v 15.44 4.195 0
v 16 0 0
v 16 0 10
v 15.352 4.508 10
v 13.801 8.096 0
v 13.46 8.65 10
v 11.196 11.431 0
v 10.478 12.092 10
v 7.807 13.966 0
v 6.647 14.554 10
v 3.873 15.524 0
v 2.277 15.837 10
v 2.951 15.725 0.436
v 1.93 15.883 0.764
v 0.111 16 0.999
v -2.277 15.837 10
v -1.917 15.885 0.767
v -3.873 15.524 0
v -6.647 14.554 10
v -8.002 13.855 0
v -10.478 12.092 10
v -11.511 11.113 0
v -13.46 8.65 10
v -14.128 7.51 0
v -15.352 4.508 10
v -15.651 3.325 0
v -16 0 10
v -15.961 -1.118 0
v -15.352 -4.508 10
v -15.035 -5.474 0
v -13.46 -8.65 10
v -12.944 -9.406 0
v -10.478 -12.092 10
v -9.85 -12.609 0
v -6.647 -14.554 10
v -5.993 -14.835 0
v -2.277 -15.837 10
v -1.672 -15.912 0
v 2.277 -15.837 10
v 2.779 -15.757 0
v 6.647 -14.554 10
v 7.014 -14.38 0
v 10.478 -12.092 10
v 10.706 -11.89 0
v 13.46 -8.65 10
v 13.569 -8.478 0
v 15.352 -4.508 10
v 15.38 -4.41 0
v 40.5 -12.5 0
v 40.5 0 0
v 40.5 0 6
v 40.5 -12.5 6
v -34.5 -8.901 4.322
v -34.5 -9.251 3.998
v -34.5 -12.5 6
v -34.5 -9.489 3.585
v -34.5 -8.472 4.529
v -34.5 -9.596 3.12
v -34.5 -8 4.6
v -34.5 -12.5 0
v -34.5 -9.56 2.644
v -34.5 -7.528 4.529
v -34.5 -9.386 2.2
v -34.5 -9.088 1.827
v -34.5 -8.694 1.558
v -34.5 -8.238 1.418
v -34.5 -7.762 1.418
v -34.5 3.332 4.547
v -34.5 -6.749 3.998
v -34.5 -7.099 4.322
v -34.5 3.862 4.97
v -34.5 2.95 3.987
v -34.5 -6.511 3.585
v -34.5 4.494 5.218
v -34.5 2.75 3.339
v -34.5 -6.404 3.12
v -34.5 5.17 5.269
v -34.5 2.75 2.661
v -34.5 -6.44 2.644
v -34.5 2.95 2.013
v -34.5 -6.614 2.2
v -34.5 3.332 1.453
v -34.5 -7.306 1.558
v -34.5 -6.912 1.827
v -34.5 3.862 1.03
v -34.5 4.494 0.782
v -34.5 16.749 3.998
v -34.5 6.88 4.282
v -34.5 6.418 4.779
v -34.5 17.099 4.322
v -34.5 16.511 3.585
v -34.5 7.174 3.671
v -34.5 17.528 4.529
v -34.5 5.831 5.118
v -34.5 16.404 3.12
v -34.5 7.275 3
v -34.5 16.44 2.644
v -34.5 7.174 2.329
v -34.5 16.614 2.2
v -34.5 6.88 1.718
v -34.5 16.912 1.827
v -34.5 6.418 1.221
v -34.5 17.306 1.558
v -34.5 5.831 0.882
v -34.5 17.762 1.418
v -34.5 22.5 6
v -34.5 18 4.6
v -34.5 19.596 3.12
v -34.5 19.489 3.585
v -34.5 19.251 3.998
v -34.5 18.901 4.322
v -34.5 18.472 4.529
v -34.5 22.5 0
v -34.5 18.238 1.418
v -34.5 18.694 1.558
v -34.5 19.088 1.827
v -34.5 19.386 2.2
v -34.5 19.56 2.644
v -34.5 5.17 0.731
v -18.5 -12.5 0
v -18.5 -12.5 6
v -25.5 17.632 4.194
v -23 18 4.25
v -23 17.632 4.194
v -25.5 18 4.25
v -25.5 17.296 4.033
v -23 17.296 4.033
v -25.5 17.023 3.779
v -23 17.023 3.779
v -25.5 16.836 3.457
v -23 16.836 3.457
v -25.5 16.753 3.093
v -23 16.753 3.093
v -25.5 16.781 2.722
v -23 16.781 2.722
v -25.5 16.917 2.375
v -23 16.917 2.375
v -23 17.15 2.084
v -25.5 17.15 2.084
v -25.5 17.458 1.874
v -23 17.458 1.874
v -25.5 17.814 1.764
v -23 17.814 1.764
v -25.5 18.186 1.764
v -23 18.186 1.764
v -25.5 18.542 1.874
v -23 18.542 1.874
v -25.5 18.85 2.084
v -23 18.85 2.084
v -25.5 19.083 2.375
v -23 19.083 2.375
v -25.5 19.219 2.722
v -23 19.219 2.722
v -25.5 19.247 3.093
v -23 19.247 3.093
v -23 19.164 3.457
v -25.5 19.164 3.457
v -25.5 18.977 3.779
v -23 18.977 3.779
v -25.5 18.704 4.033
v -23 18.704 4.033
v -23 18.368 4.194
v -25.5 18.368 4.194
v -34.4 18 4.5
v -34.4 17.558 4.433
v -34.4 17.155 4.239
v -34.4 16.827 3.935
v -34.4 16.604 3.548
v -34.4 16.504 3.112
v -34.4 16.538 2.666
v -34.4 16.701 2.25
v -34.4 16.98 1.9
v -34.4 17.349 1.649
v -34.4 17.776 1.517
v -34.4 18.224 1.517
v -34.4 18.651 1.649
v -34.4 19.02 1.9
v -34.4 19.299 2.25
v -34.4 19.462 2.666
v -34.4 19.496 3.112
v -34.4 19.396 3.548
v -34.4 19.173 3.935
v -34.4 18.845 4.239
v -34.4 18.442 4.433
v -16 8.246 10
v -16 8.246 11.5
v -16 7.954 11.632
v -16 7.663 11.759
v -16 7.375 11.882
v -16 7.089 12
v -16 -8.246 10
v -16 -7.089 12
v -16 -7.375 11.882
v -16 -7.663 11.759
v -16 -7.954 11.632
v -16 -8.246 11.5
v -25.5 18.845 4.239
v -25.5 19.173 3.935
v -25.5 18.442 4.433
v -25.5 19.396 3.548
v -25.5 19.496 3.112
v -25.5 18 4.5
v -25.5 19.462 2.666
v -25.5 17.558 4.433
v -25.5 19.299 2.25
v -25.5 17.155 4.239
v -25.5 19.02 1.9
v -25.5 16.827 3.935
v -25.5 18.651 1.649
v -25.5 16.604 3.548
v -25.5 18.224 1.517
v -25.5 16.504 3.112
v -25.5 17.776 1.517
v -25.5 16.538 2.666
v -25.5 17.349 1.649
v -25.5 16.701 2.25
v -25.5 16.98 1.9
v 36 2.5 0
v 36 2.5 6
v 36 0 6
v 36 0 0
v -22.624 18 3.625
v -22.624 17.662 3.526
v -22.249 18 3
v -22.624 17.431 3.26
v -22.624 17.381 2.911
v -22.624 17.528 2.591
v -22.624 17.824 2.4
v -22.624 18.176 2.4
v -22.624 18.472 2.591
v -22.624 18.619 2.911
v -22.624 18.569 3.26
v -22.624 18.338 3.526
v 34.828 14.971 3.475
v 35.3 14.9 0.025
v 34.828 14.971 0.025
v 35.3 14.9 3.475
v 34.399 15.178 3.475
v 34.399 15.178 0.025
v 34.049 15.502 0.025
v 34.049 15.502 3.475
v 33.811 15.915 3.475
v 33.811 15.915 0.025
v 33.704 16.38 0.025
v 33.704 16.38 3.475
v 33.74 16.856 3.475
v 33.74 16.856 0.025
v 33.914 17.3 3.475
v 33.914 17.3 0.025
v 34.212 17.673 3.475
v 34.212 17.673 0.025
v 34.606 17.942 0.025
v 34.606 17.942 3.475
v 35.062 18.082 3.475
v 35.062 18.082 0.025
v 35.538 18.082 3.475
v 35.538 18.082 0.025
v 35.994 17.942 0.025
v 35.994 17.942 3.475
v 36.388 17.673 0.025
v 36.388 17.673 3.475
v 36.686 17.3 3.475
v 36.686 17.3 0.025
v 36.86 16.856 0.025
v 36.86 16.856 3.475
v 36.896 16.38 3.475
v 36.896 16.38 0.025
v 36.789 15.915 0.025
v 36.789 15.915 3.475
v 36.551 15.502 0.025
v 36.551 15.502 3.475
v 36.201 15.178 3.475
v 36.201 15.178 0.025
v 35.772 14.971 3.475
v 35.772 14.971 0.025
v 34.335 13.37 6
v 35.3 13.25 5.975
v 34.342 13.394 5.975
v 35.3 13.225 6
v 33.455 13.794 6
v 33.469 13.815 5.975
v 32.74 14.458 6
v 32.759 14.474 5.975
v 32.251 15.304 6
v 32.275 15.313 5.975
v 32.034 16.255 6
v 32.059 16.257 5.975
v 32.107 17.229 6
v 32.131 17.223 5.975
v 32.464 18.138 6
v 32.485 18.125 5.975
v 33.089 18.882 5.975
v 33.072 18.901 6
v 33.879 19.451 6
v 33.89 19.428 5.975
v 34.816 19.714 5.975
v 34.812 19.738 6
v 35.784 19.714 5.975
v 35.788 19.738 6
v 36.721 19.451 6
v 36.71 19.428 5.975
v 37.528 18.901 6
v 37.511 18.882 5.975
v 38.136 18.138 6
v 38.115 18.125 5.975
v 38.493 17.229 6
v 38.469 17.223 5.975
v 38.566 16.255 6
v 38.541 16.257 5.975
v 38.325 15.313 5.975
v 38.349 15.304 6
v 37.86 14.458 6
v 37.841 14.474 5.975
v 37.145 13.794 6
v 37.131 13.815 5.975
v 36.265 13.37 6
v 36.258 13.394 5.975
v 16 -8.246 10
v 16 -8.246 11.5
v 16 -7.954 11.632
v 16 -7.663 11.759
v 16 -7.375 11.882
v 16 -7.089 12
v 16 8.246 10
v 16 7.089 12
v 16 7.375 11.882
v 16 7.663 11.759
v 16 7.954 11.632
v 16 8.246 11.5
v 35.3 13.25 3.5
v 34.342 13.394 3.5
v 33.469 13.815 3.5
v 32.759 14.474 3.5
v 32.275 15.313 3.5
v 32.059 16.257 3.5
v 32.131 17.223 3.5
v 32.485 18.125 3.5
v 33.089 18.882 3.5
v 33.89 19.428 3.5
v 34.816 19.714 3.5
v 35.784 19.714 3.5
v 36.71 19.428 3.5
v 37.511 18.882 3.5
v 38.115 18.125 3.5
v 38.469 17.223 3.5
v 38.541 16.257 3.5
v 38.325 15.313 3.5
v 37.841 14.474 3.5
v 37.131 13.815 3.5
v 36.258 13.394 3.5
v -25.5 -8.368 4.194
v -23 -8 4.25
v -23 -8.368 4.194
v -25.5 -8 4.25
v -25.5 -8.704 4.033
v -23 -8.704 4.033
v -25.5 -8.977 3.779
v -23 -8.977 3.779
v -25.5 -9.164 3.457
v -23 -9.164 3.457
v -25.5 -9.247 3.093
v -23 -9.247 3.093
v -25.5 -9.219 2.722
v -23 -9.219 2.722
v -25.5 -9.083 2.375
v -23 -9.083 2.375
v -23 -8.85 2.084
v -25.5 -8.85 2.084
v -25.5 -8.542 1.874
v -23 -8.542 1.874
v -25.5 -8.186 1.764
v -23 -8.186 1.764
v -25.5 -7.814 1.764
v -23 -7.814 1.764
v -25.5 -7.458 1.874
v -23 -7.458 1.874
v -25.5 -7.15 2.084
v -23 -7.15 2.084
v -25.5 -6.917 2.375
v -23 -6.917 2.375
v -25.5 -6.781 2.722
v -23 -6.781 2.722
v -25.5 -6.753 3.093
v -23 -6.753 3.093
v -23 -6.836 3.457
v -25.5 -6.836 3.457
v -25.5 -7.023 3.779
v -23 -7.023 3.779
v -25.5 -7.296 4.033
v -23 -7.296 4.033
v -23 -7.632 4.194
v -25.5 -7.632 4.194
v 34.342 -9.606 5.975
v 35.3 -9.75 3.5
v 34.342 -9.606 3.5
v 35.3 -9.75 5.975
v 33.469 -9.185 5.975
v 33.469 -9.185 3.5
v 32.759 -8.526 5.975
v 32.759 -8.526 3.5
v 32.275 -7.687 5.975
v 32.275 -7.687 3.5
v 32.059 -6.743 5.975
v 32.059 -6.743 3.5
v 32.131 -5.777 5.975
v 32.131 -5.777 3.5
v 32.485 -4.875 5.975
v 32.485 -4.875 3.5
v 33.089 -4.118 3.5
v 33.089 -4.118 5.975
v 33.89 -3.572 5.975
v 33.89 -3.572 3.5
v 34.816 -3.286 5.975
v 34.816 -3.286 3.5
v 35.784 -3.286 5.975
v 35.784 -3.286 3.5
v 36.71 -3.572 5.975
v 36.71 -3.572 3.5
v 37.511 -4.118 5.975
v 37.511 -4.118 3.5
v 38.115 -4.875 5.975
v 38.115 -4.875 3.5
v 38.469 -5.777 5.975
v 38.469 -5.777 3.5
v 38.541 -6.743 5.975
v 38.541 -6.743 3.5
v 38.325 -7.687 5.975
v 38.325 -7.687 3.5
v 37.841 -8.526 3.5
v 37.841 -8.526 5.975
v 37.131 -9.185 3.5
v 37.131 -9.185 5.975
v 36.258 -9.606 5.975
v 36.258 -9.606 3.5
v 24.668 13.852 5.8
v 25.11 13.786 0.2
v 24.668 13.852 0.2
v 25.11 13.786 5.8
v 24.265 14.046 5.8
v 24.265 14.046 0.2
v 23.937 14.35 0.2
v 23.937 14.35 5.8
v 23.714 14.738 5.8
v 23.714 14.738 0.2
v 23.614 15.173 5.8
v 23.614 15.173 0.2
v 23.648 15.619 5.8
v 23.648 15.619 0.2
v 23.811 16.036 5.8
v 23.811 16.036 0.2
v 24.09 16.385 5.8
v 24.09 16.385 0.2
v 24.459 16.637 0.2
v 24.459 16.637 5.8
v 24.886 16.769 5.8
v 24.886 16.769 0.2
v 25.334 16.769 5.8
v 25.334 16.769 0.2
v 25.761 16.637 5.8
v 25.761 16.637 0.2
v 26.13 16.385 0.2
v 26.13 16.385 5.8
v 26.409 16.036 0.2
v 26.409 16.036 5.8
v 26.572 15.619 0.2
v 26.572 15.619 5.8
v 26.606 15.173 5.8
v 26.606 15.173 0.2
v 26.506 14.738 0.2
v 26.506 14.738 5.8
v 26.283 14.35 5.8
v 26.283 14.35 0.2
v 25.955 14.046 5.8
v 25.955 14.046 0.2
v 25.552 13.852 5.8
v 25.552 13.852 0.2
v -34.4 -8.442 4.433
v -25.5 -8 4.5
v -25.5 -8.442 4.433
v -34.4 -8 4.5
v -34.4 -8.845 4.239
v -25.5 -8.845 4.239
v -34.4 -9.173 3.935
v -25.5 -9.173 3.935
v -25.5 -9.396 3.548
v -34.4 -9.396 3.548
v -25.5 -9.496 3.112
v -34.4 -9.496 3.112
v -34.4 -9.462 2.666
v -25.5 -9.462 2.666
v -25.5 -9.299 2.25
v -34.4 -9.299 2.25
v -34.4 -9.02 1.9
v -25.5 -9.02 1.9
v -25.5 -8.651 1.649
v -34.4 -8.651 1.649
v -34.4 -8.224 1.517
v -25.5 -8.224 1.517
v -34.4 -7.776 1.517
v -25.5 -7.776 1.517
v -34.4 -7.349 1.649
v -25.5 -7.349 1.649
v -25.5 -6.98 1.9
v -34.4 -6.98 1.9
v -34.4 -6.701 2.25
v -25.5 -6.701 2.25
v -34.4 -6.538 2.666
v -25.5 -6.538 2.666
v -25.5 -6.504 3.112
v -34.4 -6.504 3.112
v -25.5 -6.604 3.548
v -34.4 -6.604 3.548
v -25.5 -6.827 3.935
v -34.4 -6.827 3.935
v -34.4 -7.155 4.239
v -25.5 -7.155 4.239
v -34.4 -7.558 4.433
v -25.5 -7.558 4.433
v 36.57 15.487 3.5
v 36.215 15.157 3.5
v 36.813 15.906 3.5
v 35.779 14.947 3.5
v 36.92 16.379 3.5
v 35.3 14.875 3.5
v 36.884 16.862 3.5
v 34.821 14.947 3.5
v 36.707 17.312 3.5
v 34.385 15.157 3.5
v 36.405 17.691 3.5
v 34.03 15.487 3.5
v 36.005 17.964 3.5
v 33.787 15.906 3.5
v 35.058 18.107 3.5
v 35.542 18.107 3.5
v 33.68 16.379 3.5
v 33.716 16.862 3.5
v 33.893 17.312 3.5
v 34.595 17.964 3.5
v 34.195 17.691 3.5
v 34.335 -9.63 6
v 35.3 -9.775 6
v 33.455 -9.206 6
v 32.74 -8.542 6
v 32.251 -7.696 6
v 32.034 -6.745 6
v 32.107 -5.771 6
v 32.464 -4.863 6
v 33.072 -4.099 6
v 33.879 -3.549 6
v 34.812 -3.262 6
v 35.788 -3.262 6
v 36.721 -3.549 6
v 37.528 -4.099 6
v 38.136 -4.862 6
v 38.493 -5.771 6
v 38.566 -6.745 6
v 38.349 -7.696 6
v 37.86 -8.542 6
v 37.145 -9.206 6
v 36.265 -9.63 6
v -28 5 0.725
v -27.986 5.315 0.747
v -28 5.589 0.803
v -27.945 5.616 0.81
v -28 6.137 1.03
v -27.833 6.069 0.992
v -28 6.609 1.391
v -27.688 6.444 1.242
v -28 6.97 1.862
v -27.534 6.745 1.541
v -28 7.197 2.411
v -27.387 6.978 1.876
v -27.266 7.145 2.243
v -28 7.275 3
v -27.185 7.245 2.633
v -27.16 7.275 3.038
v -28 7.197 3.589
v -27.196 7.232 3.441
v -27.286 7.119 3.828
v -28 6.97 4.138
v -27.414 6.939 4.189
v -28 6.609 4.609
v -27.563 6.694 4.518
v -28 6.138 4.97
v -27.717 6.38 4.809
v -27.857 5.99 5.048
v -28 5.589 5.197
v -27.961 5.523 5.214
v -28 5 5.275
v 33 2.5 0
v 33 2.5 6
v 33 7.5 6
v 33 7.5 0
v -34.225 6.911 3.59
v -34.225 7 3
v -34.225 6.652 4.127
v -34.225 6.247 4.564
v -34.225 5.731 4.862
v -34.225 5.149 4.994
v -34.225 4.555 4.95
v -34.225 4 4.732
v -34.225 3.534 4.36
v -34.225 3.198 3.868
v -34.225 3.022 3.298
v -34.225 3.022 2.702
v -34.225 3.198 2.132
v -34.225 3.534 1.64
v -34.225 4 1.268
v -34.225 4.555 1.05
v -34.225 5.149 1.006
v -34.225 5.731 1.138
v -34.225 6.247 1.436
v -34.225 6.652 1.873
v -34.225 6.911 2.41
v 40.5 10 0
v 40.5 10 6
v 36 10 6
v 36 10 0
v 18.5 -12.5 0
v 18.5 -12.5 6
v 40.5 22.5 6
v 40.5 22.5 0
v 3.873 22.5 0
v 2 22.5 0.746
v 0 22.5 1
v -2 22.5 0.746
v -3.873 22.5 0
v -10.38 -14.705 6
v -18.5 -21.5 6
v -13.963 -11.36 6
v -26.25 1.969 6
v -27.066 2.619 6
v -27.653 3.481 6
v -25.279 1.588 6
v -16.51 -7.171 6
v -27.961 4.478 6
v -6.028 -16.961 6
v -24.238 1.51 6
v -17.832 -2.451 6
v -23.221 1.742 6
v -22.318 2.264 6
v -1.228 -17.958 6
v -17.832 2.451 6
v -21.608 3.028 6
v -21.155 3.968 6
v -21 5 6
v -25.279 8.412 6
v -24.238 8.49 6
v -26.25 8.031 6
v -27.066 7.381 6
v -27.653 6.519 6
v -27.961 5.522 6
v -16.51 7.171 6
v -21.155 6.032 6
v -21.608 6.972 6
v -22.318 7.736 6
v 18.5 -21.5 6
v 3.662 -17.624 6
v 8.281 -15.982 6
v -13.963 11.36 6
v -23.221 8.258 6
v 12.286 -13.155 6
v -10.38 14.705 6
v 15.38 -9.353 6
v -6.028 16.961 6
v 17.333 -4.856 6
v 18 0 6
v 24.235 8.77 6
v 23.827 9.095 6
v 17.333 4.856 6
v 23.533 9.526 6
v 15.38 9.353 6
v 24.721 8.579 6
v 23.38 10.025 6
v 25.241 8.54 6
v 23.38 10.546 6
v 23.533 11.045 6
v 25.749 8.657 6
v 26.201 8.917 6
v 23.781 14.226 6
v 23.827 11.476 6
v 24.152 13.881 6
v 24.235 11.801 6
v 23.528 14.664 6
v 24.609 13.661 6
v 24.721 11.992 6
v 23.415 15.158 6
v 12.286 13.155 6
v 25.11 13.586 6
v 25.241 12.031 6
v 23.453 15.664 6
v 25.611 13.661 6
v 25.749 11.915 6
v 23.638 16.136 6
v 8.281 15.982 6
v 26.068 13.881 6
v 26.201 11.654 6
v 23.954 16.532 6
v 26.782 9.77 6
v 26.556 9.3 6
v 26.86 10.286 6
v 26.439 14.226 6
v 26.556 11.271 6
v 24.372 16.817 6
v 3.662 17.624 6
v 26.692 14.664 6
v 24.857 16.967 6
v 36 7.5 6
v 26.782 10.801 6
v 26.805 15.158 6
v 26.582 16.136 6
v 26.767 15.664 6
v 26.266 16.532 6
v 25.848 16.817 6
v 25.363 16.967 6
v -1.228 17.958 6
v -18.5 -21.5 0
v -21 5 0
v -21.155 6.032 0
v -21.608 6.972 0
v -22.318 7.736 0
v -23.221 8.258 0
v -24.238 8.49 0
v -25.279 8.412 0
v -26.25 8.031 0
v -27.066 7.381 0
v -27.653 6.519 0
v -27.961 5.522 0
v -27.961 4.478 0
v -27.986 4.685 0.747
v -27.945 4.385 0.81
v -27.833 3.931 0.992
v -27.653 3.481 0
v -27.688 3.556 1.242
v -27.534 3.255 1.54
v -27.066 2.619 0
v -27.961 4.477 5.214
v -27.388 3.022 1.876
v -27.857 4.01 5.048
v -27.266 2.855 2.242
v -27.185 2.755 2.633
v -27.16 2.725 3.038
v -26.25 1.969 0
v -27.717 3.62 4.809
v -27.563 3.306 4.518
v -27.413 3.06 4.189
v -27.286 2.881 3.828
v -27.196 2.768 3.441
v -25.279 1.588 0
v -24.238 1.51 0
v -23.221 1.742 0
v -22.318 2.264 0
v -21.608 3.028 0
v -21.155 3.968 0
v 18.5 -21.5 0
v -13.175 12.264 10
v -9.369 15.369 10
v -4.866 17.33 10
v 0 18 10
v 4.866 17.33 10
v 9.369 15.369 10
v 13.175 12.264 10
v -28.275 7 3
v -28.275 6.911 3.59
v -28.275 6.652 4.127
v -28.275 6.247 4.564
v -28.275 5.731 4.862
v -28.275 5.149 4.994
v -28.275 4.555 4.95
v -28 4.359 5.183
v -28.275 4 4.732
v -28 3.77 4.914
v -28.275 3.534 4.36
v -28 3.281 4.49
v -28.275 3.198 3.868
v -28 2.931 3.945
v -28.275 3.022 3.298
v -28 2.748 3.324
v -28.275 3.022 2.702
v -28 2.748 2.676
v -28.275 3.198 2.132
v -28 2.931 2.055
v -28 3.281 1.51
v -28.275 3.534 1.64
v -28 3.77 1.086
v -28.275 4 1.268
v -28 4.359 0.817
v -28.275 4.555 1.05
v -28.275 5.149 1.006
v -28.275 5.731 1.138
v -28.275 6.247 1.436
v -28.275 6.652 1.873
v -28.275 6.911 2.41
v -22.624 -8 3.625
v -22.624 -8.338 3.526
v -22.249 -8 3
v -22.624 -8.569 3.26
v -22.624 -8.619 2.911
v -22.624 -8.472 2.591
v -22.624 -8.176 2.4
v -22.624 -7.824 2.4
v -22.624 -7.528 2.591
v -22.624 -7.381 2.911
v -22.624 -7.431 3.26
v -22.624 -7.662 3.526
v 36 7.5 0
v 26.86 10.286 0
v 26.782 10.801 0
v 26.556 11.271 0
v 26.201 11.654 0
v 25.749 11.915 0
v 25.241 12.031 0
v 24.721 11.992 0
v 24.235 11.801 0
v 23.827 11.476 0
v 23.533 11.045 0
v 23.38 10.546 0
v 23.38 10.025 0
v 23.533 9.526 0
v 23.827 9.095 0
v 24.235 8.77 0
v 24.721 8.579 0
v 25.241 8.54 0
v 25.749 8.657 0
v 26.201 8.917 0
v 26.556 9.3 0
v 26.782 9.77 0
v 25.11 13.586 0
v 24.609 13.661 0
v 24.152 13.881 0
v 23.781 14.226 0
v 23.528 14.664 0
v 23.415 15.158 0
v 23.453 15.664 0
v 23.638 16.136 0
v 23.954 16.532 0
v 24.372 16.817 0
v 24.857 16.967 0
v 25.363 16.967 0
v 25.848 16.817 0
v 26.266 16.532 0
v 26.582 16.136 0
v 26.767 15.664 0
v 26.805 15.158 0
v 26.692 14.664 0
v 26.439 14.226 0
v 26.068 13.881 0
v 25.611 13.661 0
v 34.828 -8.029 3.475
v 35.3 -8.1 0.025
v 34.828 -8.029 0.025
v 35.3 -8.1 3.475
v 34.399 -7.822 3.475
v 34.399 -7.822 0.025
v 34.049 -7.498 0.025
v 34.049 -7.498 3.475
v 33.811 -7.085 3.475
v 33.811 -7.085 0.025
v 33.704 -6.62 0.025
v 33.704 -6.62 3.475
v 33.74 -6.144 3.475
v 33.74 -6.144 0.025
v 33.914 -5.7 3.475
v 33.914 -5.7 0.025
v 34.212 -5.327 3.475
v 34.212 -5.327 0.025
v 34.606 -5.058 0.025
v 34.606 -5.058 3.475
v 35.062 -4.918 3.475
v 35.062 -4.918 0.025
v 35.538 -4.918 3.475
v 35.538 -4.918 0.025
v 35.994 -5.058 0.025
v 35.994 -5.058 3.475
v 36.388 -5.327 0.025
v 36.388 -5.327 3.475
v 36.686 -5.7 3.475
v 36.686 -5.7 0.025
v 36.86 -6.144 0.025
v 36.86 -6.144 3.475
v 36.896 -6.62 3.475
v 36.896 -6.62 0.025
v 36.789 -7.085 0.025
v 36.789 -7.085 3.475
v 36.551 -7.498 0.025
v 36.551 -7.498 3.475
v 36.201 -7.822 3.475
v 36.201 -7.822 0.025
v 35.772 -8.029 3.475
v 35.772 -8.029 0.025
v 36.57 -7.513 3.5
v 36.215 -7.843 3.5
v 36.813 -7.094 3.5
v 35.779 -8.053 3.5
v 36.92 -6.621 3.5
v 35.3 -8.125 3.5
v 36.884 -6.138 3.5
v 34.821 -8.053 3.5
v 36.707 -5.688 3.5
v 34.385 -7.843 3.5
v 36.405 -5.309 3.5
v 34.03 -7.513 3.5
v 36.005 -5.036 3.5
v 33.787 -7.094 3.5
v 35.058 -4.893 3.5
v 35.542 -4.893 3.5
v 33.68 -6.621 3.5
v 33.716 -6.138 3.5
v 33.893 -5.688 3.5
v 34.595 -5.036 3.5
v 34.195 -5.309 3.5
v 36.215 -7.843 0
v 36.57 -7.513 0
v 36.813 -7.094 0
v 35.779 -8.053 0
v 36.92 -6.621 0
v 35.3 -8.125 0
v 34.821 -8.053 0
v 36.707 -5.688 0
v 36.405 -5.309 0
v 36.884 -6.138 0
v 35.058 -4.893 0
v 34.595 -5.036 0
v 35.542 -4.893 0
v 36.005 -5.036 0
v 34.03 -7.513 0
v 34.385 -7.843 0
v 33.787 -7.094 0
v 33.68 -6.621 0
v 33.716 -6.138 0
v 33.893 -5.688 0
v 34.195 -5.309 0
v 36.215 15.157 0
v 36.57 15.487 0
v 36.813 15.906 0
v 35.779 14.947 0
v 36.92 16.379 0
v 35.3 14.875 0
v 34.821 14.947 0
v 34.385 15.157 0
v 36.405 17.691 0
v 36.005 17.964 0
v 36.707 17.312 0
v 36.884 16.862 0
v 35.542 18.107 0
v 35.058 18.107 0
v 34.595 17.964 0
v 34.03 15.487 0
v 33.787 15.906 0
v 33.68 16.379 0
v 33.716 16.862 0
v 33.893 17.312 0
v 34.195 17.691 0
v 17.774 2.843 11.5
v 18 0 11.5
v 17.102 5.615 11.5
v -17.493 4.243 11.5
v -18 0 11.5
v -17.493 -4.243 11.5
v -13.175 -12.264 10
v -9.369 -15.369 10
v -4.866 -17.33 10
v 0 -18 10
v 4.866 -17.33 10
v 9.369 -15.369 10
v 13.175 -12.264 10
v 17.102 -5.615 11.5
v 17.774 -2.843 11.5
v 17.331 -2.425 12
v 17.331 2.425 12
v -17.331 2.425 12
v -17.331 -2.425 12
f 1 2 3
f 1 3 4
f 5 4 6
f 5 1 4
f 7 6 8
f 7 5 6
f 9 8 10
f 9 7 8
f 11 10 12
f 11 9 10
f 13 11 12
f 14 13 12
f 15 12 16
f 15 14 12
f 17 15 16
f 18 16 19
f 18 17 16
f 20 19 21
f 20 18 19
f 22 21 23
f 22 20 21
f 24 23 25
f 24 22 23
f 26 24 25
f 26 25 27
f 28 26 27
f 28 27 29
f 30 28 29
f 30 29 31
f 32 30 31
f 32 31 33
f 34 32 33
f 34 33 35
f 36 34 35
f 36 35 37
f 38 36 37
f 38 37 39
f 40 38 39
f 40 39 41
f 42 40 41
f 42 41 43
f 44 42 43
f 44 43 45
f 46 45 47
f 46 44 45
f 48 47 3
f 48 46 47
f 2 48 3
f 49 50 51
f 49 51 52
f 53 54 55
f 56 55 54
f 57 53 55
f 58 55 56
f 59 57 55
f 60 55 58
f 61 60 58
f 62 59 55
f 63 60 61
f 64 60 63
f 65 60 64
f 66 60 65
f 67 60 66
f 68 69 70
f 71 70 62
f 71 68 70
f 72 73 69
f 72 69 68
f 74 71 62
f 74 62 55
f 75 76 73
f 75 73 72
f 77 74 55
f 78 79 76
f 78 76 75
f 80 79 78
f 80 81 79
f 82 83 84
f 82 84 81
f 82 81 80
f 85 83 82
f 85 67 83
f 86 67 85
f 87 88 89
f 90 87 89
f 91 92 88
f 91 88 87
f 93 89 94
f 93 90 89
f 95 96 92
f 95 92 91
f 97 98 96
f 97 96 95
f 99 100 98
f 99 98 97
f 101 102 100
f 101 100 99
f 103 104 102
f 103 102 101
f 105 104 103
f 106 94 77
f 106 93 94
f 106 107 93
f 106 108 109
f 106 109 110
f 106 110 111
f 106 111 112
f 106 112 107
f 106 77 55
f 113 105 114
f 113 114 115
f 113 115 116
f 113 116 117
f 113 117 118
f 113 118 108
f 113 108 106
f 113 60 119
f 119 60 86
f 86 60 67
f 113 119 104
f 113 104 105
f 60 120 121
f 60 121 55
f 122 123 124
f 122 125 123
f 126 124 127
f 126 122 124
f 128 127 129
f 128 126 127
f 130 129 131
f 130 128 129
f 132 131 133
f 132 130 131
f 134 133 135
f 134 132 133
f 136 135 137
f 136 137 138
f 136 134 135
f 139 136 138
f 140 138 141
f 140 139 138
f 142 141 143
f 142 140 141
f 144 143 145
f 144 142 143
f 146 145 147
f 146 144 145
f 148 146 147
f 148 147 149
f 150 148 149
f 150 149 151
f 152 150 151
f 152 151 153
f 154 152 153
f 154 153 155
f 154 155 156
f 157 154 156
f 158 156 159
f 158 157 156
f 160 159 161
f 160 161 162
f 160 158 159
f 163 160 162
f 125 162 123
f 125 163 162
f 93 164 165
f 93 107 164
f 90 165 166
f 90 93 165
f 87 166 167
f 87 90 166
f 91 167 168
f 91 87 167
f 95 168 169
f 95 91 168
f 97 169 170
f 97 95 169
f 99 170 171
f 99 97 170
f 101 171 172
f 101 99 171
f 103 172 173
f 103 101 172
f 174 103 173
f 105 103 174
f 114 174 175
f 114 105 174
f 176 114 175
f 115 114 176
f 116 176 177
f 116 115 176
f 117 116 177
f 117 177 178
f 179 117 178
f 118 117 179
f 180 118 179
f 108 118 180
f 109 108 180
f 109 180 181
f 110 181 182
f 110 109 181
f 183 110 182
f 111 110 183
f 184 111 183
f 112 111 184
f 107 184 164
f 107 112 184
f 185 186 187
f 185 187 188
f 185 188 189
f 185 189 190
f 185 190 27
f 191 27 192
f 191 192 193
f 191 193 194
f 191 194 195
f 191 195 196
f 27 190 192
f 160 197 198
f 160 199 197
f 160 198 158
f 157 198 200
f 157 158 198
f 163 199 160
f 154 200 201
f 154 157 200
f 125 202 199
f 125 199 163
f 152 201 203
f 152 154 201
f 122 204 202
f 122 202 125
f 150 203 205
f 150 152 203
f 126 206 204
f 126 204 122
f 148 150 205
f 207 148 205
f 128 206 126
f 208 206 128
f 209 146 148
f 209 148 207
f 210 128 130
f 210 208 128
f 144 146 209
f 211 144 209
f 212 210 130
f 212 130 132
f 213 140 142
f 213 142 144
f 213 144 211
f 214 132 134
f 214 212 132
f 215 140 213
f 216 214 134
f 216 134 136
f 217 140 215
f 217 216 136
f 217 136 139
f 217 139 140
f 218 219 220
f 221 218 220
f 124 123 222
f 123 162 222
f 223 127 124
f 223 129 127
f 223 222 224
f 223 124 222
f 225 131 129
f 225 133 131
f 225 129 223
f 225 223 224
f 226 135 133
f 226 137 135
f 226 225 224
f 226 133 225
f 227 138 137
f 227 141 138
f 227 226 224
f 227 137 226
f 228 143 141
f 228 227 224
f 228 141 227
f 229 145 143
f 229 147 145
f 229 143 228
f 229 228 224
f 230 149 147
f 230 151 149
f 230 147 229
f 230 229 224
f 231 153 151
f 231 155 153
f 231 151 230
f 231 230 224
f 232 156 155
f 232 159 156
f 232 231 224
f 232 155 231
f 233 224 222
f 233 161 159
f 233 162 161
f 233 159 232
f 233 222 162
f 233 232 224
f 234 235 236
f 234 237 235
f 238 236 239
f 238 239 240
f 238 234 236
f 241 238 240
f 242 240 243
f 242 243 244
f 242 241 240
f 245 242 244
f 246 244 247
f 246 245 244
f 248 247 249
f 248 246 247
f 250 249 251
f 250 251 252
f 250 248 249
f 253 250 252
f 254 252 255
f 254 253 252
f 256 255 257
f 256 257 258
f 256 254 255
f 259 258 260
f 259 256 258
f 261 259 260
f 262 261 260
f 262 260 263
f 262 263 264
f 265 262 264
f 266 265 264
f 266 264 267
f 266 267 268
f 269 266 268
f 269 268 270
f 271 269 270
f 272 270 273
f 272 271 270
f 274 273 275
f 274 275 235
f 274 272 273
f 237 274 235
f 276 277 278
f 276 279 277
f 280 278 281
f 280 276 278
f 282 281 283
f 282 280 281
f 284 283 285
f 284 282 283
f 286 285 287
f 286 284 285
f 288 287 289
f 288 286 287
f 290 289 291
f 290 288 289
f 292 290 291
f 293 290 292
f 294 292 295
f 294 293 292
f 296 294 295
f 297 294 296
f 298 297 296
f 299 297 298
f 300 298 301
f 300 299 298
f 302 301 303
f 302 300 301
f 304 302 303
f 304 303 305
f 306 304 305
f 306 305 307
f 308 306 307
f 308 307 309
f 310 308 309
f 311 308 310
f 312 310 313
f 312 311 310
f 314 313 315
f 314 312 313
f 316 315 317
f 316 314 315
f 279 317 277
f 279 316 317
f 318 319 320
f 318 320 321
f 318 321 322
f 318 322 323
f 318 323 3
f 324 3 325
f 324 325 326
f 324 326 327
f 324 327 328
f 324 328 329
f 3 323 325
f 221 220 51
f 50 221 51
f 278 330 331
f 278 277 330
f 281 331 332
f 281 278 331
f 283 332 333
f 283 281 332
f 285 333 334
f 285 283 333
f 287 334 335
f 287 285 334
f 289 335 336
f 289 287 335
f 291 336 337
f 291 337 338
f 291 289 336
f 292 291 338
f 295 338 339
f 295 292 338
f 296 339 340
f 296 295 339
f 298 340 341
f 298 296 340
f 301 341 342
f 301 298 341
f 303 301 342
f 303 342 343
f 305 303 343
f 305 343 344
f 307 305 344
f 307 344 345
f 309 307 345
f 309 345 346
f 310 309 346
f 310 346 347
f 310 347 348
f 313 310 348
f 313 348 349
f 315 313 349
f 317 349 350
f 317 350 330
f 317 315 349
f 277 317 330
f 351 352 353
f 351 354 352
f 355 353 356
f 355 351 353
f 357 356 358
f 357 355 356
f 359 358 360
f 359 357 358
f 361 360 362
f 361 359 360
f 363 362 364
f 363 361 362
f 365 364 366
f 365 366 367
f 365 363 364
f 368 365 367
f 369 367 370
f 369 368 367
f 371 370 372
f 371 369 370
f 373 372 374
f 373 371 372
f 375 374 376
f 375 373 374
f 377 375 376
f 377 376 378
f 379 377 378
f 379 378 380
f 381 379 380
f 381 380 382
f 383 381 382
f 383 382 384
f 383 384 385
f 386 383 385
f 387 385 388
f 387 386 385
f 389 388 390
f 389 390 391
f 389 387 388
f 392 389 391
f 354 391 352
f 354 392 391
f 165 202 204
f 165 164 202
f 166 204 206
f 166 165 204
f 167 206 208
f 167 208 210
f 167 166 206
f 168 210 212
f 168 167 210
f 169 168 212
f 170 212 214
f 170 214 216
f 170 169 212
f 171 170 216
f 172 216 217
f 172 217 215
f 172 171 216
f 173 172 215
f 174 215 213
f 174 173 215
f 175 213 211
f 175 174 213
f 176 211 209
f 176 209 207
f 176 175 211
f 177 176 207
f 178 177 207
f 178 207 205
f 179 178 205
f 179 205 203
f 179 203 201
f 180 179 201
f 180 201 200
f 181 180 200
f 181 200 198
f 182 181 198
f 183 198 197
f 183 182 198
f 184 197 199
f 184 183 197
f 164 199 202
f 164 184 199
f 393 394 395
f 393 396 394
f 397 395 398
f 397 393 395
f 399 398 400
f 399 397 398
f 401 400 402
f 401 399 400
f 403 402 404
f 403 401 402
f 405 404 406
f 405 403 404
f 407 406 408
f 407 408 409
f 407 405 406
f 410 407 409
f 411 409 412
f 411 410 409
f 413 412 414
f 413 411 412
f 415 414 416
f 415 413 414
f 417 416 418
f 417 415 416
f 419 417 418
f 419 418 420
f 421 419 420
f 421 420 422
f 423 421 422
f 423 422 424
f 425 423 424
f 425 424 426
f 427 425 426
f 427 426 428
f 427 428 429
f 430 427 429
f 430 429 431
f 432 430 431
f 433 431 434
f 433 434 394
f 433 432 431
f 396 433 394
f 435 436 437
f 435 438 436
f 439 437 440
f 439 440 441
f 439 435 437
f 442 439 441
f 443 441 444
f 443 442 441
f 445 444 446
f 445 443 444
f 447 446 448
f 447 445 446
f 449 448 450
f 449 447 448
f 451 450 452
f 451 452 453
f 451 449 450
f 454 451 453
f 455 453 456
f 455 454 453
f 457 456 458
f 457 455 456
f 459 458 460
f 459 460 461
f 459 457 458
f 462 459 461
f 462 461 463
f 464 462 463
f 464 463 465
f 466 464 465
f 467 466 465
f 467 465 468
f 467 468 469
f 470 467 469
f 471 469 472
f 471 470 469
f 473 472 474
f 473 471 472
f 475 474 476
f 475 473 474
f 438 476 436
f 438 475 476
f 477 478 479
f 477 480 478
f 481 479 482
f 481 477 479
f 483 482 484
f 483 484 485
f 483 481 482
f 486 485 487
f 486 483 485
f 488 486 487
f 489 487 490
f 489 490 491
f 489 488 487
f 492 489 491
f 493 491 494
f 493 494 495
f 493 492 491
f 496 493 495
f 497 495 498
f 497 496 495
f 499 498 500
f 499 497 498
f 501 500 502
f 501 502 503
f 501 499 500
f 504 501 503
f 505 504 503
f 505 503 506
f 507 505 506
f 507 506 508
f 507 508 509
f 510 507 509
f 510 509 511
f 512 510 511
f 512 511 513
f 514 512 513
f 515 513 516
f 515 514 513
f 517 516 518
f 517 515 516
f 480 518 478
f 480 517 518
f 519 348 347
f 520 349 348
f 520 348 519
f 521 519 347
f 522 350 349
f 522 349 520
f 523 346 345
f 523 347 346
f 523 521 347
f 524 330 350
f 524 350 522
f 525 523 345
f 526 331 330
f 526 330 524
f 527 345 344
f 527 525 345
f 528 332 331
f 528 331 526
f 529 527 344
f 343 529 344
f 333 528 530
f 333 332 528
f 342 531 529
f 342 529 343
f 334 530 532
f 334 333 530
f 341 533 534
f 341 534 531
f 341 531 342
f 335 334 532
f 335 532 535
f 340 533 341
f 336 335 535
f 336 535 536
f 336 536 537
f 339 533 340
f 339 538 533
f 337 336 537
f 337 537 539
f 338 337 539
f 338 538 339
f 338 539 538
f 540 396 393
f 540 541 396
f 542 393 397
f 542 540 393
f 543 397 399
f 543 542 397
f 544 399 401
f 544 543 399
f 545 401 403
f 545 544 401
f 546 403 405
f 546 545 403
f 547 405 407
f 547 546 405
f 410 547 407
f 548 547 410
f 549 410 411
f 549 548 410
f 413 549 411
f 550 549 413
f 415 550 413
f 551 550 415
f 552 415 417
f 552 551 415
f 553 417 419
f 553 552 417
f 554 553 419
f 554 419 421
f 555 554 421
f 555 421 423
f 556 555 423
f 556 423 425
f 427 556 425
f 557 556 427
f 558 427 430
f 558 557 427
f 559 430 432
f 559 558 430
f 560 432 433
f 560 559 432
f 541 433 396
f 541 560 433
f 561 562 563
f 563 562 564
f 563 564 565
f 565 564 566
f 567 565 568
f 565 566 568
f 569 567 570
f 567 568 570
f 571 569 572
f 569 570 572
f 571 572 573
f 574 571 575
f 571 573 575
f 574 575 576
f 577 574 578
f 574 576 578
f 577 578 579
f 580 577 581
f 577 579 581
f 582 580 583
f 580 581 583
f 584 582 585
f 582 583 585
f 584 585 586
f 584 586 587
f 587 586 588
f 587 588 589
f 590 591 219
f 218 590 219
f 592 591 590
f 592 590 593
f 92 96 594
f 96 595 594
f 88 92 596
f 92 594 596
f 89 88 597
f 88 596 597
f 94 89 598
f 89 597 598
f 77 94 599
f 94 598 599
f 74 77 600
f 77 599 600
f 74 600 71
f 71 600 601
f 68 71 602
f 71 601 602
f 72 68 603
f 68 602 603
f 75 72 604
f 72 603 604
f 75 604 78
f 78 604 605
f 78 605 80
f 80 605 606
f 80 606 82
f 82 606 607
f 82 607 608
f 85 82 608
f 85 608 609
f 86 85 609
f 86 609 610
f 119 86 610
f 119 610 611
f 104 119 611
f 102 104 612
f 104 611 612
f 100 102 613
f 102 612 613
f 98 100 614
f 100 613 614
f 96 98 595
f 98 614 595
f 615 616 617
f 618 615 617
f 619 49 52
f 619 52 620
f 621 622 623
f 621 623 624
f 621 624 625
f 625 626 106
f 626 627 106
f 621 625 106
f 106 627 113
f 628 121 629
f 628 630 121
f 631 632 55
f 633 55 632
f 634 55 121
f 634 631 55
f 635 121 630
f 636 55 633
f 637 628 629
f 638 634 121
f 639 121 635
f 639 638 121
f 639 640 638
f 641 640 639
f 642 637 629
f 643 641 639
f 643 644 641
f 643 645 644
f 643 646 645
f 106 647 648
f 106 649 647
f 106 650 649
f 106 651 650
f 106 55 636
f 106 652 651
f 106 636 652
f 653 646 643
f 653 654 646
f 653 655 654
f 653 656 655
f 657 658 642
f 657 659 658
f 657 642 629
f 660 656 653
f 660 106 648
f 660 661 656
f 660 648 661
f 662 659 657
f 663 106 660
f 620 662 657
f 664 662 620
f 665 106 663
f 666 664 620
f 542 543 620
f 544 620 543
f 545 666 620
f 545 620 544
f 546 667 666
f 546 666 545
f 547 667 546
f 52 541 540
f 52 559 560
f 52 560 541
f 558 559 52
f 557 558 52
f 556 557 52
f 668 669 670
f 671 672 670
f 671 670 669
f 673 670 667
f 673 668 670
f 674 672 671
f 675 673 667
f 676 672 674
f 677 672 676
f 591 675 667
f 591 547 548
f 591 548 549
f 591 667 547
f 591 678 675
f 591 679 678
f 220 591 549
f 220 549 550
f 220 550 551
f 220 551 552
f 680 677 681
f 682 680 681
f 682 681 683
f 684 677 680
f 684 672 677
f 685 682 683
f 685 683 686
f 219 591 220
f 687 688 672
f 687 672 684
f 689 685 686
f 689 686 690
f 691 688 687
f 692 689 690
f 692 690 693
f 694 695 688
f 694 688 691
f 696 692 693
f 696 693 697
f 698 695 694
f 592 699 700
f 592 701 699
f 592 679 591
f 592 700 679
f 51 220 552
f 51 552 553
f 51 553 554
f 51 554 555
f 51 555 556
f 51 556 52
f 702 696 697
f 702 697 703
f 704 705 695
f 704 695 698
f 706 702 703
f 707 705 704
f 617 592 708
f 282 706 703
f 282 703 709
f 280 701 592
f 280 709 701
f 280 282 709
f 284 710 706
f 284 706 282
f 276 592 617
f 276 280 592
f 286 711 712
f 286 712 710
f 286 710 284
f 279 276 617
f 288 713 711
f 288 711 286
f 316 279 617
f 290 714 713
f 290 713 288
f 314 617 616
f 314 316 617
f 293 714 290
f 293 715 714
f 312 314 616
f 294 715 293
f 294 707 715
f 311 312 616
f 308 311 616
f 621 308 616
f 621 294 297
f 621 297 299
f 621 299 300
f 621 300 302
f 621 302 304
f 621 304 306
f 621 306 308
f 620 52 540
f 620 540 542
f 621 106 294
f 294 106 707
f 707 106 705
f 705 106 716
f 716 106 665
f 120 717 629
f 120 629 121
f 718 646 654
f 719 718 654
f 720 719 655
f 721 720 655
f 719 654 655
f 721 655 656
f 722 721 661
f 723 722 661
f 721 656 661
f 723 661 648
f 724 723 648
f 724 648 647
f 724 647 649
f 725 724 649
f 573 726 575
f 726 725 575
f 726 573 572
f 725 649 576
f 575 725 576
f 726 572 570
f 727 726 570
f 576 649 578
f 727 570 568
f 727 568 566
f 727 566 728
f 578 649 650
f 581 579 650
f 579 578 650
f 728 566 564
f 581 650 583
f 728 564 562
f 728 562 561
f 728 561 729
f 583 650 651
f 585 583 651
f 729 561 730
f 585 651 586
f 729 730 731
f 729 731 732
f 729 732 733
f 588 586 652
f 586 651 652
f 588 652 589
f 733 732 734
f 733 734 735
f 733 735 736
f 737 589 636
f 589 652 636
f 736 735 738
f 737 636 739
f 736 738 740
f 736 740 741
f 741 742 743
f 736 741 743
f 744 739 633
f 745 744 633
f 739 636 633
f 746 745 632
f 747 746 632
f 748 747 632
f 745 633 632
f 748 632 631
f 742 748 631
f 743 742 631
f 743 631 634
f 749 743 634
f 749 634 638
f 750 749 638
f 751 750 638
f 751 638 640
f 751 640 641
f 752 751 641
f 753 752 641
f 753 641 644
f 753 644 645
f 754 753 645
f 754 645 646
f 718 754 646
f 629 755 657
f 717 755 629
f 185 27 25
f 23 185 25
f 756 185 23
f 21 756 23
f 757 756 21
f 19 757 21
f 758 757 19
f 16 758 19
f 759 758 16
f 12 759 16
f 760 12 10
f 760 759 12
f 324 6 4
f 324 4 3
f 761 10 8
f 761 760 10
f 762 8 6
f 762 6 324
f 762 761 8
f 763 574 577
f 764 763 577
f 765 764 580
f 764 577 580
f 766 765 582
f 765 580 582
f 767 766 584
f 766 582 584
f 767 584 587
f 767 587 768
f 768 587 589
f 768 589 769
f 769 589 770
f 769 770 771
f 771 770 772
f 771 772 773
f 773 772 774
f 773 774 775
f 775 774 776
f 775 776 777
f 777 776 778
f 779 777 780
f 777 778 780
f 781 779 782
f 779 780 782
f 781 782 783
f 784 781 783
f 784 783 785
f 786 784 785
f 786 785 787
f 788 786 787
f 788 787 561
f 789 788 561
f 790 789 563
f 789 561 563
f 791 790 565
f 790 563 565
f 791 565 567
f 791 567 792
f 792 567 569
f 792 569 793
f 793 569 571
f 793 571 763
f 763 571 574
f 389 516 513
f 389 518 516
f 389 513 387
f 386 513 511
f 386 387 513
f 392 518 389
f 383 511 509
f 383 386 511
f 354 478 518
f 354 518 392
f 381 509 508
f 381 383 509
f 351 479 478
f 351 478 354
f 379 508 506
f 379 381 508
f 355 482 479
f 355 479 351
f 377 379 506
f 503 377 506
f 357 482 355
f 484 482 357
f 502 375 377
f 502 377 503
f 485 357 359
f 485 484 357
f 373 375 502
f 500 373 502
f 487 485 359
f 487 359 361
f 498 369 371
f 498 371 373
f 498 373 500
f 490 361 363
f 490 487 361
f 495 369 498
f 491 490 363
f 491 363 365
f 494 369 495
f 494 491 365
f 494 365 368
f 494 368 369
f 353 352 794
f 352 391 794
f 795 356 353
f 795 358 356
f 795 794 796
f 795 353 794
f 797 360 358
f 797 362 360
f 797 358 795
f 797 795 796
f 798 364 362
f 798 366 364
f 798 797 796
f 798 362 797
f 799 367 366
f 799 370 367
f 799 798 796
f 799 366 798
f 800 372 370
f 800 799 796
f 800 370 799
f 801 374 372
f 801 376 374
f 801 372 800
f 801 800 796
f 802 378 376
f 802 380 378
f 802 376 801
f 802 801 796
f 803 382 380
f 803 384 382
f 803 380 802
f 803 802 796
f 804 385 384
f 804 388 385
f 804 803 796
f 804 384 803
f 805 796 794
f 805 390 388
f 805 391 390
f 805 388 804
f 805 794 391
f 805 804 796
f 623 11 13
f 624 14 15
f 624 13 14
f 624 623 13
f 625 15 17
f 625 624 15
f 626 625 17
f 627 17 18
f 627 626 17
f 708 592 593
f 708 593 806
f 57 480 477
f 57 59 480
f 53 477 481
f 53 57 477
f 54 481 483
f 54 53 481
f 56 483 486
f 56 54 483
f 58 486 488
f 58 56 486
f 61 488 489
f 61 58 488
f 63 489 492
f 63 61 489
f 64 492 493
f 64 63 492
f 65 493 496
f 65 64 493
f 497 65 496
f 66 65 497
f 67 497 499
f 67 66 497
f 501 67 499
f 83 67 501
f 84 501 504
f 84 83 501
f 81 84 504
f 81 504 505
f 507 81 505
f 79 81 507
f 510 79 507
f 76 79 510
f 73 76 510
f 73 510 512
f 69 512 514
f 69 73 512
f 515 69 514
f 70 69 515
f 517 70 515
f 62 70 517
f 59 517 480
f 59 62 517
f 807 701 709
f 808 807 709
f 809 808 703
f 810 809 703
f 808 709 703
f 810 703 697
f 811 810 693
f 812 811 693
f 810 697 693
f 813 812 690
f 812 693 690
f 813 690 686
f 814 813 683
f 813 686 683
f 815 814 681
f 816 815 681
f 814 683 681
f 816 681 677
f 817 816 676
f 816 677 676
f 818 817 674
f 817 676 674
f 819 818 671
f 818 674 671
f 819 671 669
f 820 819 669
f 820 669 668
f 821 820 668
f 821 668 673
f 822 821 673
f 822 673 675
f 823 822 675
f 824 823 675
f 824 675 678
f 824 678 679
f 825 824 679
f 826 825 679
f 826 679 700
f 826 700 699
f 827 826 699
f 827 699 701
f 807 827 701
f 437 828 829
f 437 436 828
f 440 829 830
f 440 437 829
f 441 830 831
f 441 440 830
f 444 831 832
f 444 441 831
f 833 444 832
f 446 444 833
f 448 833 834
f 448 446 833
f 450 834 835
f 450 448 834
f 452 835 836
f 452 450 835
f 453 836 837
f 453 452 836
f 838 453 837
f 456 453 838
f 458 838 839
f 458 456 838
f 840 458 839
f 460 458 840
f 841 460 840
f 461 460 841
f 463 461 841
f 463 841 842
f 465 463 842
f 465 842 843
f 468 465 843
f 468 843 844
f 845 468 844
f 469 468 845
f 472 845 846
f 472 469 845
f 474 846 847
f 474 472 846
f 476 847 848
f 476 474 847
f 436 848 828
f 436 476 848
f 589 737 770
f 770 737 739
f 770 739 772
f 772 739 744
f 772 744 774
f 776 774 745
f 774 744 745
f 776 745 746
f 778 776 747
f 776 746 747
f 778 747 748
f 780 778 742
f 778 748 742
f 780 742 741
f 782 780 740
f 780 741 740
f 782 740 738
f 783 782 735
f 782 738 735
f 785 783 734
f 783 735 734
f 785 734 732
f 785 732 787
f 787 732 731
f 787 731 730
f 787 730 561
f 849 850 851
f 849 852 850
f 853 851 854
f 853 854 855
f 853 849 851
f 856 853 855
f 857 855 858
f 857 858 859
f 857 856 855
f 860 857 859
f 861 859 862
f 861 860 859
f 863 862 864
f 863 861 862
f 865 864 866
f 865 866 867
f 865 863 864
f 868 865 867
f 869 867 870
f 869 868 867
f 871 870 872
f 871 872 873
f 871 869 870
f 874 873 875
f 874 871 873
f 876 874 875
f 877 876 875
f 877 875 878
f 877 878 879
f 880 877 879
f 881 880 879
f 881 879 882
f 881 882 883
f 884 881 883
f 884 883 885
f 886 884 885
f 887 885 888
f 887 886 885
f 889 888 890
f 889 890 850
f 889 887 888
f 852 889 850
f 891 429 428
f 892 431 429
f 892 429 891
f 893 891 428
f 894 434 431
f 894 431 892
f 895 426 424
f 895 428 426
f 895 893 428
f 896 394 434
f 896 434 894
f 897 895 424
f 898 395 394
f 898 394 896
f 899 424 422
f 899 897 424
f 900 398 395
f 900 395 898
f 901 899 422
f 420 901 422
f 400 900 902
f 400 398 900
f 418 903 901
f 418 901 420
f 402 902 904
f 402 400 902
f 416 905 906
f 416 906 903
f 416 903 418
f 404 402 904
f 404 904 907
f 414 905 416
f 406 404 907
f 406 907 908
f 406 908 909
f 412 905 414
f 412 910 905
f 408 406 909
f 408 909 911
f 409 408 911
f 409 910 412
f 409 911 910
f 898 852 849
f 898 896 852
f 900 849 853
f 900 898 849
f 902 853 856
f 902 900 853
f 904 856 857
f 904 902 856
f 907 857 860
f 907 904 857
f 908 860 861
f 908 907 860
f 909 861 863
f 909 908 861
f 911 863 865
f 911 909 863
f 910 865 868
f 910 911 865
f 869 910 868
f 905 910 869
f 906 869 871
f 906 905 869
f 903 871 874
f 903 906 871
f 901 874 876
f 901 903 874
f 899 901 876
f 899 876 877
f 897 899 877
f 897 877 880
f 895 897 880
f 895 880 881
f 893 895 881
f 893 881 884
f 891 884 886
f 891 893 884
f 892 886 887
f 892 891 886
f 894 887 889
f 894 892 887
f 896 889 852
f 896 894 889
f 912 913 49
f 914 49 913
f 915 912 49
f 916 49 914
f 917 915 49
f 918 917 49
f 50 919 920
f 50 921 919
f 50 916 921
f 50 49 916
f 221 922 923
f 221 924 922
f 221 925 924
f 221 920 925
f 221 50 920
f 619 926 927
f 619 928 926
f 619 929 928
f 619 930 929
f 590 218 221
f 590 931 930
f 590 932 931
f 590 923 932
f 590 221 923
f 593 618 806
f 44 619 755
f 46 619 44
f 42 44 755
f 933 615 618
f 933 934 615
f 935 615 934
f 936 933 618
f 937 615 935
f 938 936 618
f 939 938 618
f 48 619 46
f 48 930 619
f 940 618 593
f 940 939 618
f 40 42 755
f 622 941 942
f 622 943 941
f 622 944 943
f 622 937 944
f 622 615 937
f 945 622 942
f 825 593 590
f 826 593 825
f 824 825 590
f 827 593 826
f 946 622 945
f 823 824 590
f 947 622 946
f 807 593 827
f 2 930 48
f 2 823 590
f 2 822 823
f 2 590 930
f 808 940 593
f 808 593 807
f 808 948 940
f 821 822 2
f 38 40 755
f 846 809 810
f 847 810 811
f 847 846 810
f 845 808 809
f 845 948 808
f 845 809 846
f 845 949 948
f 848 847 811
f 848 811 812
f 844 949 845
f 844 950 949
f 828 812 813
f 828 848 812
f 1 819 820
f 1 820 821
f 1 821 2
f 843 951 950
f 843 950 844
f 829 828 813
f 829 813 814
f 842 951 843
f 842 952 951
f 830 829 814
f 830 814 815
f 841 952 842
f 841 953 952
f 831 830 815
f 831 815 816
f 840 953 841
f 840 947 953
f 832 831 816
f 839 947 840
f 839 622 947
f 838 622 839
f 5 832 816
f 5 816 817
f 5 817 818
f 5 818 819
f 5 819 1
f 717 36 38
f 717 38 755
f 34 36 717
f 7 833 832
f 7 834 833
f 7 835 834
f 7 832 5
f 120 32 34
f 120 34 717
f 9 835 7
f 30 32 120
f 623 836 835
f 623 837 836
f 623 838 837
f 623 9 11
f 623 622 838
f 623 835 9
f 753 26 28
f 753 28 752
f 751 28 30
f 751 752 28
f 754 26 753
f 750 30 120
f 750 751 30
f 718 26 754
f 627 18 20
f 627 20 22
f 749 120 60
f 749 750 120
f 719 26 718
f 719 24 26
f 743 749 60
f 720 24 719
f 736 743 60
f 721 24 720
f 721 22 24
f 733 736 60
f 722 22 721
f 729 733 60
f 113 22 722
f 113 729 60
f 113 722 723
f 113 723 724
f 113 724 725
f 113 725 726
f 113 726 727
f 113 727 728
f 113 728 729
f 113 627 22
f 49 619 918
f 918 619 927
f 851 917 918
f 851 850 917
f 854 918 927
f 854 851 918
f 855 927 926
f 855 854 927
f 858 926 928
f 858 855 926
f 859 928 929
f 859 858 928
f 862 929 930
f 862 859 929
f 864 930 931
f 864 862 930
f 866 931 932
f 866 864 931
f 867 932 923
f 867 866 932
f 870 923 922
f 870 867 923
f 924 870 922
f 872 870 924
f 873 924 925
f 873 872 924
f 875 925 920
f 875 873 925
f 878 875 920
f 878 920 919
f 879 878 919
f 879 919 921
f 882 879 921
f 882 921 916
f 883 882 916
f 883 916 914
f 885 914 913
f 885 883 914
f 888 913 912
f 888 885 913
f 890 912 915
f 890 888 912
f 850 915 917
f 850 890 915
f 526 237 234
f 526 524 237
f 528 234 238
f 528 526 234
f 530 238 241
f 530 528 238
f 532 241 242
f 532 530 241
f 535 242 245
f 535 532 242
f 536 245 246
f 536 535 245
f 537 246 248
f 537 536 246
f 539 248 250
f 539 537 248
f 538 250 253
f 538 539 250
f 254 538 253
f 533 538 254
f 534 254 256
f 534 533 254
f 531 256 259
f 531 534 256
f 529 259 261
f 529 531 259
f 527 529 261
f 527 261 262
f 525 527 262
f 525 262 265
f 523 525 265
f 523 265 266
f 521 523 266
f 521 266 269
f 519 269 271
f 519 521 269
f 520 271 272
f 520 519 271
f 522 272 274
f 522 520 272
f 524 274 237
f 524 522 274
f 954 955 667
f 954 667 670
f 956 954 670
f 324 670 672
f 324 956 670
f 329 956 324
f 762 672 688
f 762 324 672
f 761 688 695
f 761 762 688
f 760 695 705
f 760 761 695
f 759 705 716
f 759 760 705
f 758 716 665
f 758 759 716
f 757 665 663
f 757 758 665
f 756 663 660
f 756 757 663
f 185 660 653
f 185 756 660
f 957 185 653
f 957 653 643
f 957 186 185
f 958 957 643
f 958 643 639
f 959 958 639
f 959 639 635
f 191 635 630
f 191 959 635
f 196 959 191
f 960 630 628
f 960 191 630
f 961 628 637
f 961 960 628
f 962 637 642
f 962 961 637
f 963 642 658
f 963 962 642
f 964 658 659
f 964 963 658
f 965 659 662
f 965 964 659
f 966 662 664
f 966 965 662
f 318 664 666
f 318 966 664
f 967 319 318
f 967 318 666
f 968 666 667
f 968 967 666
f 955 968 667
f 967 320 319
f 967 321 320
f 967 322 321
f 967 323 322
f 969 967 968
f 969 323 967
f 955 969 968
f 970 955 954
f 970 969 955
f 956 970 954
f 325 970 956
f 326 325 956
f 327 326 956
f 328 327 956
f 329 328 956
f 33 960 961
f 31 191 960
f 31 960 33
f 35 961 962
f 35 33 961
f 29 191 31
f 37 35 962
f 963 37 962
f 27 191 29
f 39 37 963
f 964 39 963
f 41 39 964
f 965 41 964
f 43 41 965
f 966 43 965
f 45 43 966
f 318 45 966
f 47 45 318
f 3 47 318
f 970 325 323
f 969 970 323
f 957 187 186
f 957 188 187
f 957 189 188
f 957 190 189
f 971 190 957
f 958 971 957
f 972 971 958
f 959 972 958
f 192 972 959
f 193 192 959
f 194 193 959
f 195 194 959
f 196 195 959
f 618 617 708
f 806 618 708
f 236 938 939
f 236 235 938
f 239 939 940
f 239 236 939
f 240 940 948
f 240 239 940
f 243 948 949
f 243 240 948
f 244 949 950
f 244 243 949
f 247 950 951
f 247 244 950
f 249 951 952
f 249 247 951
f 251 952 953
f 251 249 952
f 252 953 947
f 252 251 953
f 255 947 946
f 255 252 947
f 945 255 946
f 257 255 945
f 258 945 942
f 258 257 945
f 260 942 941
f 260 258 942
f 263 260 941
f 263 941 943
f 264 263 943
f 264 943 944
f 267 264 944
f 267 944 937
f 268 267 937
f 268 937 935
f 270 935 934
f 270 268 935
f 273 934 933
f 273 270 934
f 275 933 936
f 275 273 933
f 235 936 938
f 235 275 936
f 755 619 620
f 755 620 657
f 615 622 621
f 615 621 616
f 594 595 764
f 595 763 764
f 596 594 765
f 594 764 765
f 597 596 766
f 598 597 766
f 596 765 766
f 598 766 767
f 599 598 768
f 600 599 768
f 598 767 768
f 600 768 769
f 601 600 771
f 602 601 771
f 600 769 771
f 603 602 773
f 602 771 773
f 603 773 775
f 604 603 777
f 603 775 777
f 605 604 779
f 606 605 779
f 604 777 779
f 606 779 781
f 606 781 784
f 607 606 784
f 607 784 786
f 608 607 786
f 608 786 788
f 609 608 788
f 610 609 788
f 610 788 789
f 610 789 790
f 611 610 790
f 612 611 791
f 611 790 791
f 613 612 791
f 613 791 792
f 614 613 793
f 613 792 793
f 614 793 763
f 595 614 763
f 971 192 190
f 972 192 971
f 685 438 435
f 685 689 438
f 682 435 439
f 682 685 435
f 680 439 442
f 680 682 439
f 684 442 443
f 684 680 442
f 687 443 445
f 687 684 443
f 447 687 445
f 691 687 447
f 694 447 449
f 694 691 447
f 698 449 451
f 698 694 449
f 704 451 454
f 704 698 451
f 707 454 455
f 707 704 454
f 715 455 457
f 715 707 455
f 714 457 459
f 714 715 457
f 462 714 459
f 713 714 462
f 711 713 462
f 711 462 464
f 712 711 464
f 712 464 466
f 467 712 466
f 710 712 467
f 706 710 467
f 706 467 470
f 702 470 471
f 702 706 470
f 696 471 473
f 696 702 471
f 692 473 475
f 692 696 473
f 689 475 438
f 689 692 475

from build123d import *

# Parameters (mm, degrees)
SKETCH_1_R                  = 16
EXTRUDE_1_DEPTH             = 12
SKETCH_3_R                  = 18
CUT_EXTRUDE_2_DEPTH         = 6
CUT_EXTRUDE_5_DEPTH         = 2
CUT_EXTRUDE_6_REACH         = 62.994
CUT_EXTRUDE_6_END_RADIUS    = 16
HOLE_WIZARD_M3_AT_2_COUNT   = 2
HOLE_WIZARD_M3_AT_2_PITCH   = 23
HOLE_WIZARD_M3_1_AT_2_COUNT = 2
HOLE_WIZARD_M3_1_AT_2_PITCH = 26
SKETCH_11_R                 = 3.5
CUT_EXTRUDE_8_DEPTH         = 47.717234568
SKETCH_12_W                 = 3
SKETCH_12_H                 = 5
CUT_EXTRUDE_9_DEPTH         = 47.717234568
SKETCH_15_R                 = 1.75
CUT_EXTRUDE_10_DEPTH        = 47.717234568
CHAMFER_1_SIZE              = 0.5


# Read off the part's stored shape, not the designer's step: M4
with BuildPart() as part:
    # Эскиз1 → Бобышка-Вытянуть1 (new body)
    with BuildSketch(Plane.XY):
        Polygon((-34.5, 22.5), (12.5, 22.5), (40.5, 22.5), (40.5, -12.5), (18.5, -12.5), (18.5, -21.5), (-18.5, -21.5), (-18.5, -12.5), (-34.5, -12.5), align=None)
        Circle(SKETCH_1_R, mode=Mode.SUBTRACT)
    extrude(amount=EXTRUDE_1_DEPTH)

    # Эскиз3 → Вырез-Вытянуть2 (cut)
    with BuildSketch(Plane.XY.offset(12)):
        Polygon((18.5, -21.5), (18.5, -12.5), (40.5, -12.5), (40.5, 22.5), (-34.5, 22.5), (-34.5, -12.5), (-18.5, -12.5), (-18.5, -21.5), align=None)
        Circle(SKETCH_3_R, mode=Mode.SUBTRACT)
    extrude(amount=-CUT_EXTRUDE_2_DEPTH, mode=Mode.SUBTRACT)

    # Эскиз4 → Вырез-Вытянуть5 (cut)
    with BuildSketch(Plane.XY.offset(12)):
        with BuildLine():
            ThreePointArc((16, 8.246211251), (0, 18), (-16, 8.246211251))
            Line((-16, 8.246211251), (-16, 8.8e-08))
            ThreePointArc((-16, 8.8e-08), (4.4e-08, 16), (16, 0))
            Line((16, 0), (16, 8.246211251))
        make_face()
        with BuildLine():
            ThreePointArc((16, 0), (-4.4e-08, -16), (-16, 8.8e-08))
            Line((-16, 8.8e-08), (-16, -8.246211251))
            ThreePointArc((-16, -8.246211251), (0, -18), (16, -8.246211251))
            Line((16, -8.246211251), (16, 0))
        make_face()
    extrude(amount=-CUT_EXTRUDE_5_DEPTH, mode=Mode.SUBTRACT)

    # Вырез-Вытянуть6: up to this cylinder (the profile starts outside it)
    cut_extrude_6_end = Plane(origin=(0, 0, 0.402223), z_dir=(0, 0, -1)) * Cylinder(CUT_EXTRUDE_6_END_RADIUS, 158.988, mode=Mode.PRIVATE)
    # Эскиз5 → Вырез-Вытянуть6 (cut, up to the surface)
    with BuildSketch(Plane(origin=(0, 22.5, 0), x_dir=(1, 0, 0), z_dir=(0, 1, 0)), mode=Mode.PRIVATE) as cut_extrude_6_sk1:
        with BuildLine():
            Line((-3.872983346, 0), (3.872983346, 0))
            ThreePointArc((3.872983346, 0), (0, -1), (-3.872983346, 0))
        make_face()
    cut_extrude_6_tool1 = extrude(cut_extrude_6_sk1.sketch, amount=-CUT_EXTRUDE_6_REACH, mode=Mode.PRIVATE) - cut_extrude_6_end
    add(cut_extrude_6_tool1.solids().sort_by_distance((0, 22.5, 0.402223))[0], mode=Mode.SUBTRACT)

    # Эскиз7 → Цековка для  M3 (revolve, cut)
    with BuildSketch(Plane(origin=(35.3, 16.5, 6), x_dir=(0, -1, 0), z_dir=(1, 0, 0))):
        Polygon((0, 0), (0, 6), (1.625, 6), (1.6, 5.975), (1.6, 2.525), (1.625, 2.5), (3.25, 2.5), (3.25, 0.025), (3.275, 0), align=None)
    hole_wizard_m3 = revolve(axis=Axis((35.3, 16.5, 12.35), (0, 0, -1)), mode=Mode.SUBTRACT)

    # Цековка для  M3 at 2: Цековка для  M3 ×2
    with Locations(*[(0, -i * HOLE_WIZARD_M3_AT_2_PITCH, 0) for i in range(1, HOLE_WIZARD_M3_AT_2_COUNT)]):
        add(hole_wizard_m3, mode=Mode.SUBTRACT)

    # Эскиз9 → M3_1 (revolve, cut)
    with BuildSketch(Plane(origin=(-34.5, -8, 3), x_dir=(0, 0, 1), z_dir=(0, 1, 0))):
        Polygon((0, 0), (0, 12.251075774), (1.25, 11.5), (1.25, 9), (1.5, 9), (1.5, 0.1), (1.6, 0), align=None)
    hole_wizard_m3_1 = revolve(axis=Axis((-40.85, -8, 3), (1, 0, 0)), mode=Mode.SUBTRACT)

    # M3_1 at 2: M3_1 ×2
    with Locations(*[(0, i * HOLE_WIZARD_M3_1_AT_2_PITCH, 0) for i in range(1, HOLE_WIZARD_M3_1_AT_2_COUNT)]):
        add(hole_wizard_m3_1, mode=Mode.SUBTRACT)

    # Эскиз11 → Вырез-Вытянуть8 (cut, through all)
    with BuildSketch(Plane.XY.offset(6)):
        with Locations((-24.5, 5)):
            Circle(SKETCH_11_R)
    extrude(amount=-CUT_EXTRUDE_8_DEPTH, mode=Mode.SUBTRACT)

    # Эскиз12 → Вырез-Вытянуть9 (cut, through all)
    with BuildSketch(Plane.XY.offset(6)):
        Polygon((40.5, 0), (40.5, 10), (36, 10), (36, 7.5), (36, 2.5), (36, 0), align=None)
        with Locations((34.5, 5)):
            Rectangle(SKETCH_12_W, SKETCH_12_H)
    extrude(amount=-CUT_EXTRUDE_9_DEPTH, mode=Mode.SUBTRACT)

    # M4 outline → M4 (revolve, cut)
    with BuildSketch(Plane(origin=(0, 5, 3), x_dir=(0, 1, 0), z_dir=(0, 0, -1))):
        Polygon((2.275, -28), (2.275, -27.159503456), (0, -27.159503456), (0, -34.5), (2.275, -34.5), (2, -34.225), (2, -28.275), align=None)
    revolve(axis=Axis((0, 5, 3), (1, 0, 0)), mode=Mode.SUBTRACT)

    # Эскиз15 → Вырез-Вытянуть10 (cut, through all)
    with BuildSketch(Plane.XY.offset(6)):
        with Locations((25.11, 10.285533906)):
            Circle(SKETCH_15_R)
    extrude(amount=-CUT_EXTRUDE_10_DEPTH, mode=Mode.SUBTRACT)

    # Эскиз16 → M3_2 (revolve, cut)
    with BuildSketch(Plane(origin=(25.11, 15.285533906, 6), x_dir=(0, -1, 0), z_dir=(1, 0, 0))):
        Polygon((0, 0), (0, 6), (1.7, 6), (1.5, 5.8), (1.5, 0.2), (1.7, 0), align=None)
    revolve(axis=Axis((25.11, 15.285533906, 12.35), (0, 0, -1)), mode=Mode.SUBTRACT)

    # Фаска1
    chamfer_1_edges = [part.edges().sort_by_distance(p)[0] for p in [
        (-18, 0, 12),
        (17.492855685, -4.242640687, 12),
    ]]
    chamfer(chamfer_1_edges, length=CHAMFER_1_SIZE)


solid = part.part
